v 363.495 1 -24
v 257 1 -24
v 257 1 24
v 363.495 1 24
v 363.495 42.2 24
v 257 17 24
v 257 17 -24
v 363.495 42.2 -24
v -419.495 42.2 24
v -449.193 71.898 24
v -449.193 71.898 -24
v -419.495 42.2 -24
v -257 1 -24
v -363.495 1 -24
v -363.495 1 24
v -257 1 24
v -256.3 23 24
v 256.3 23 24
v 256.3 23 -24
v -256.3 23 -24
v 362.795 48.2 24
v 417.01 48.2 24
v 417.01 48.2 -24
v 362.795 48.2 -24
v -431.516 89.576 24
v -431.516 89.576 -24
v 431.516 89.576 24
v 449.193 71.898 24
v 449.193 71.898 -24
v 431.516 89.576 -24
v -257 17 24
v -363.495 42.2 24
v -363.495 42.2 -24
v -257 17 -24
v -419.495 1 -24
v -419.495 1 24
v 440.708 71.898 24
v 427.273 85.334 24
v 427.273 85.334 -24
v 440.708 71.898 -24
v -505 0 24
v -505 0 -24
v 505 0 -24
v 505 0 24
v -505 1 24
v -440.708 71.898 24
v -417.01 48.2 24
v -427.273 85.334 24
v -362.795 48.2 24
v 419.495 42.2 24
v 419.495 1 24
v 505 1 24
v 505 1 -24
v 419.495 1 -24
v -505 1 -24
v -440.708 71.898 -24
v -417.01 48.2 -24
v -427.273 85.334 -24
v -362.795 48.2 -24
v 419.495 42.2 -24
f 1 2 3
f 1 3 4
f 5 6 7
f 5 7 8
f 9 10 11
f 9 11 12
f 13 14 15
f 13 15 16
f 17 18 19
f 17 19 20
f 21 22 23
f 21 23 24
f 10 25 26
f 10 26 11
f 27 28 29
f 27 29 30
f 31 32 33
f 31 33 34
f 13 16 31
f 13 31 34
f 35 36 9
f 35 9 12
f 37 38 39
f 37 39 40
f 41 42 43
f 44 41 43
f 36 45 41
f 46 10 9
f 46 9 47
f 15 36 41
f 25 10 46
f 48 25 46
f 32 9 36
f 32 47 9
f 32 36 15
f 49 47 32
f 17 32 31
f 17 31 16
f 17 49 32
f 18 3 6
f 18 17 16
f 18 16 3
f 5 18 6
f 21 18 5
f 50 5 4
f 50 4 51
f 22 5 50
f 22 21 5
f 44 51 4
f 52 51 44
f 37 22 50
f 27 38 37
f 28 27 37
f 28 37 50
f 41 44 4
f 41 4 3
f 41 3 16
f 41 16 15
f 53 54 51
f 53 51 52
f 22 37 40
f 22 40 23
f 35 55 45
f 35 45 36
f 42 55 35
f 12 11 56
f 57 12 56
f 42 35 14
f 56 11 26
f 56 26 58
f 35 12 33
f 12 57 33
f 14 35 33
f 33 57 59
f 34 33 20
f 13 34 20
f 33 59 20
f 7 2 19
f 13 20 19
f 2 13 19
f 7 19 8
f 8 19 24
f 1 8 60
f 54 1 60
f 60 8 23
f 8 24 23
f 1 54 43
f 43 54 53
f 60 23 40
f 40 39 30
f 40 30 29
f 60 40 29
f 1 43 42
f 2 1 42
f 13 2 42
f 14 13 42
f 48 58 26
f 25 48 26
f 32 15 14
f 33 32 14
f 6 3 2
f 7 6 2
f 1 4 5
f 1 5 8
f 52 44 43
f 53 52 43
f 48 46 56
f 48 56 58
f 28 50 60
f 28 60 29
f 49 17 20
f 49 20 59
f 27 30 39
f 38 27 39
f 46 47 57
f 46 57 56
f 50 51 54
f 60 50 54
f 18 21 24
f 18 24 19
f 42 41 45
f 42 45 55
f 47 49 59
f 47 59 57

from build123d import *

# Parameters (mm, degrees)
SKETCH2_W           = 1010
SKETCH2_H           = 48
BOSS_EXTRUDE1_DEPTH = 1
SKETCH3_W           = 514
SKETCH3_H           = 48
BOSS_EXTRUDE2_DEPTH = 16
SKETCH4_W           = 56
SKETCH4_H           = 48
BOSS_EXTRUDE3_DEPTH = 41.2
EXTRUDE_THIN1_DEPTH = 48


with BuildPart() as part:
    # Sketch2 → Boss-Extrude1 (new body)
    with BuildSketch(Plane(origin=(0, 0, 0), x_dir=(1, 0, 0), z_dir=(0, 1, 0))):
        Rectangle(SKETCH2_W, SKETCH2_H)
    extrude(amount=BOSS_EXTRUDE1_DEPTH)

    # Sketch3 → Boss-Extrude2 (add)
    with BuildSketch(Plane(origin=(0, 1, 0), x_dir=(1, 0, 0), z_dir=(0, 1, 0))):
        Rectangle(SKETCH3_W, SKETCH3_H)
    extrude(amount=BOSS_EXTRUDE2_DEPTH)

    # Sketch4 → Boss-Extrude3 (add)
    with BuildSketch(Plane(origin=(0, 1, 0), x_dir=(1, 0, 0), z_dir=(0, 1, 0))):
        with Locations((-391.494906848, 0)):
            Rectangle(SKETCH4_W, SKETCH4_H)
    boss_extrude3 = extrude(amount=BOSS_EXTRUDE3_DEPTH)

    # Mirror1: Boss-Extrude3 across plane
    add(boss_extrude3.mirror(Plane(origin=(0, 0, 0), x_dir=(0, 0, 1), z_dir=(1, 0, 0))))

    # Sketch7 → Extrude-Thin1 (add)
    with BuildSketch(Plane.XY.offset(24)):
        Polygon((-431.515722128, 89.576154339), (-449.193391658, 71.89848481), (-419.494906848, 42.2), (-363.494906848, 42.2), (-257, 17), (257, 17), (363.494906848, 42.2), (419.494906848, 42.2), (449.193391658, 71.89848481), (431.515722128, 89.576154339), (427.273081441, 85.333513652), (440.708110284, 71.89848481), (417.009625474, 48.2), (362.794682376, 48.2), (256.299775528, 23), (-256.299775528, 23), (-362.794682376, 48.2), (-417.009625474, 48.2), (-440.708110284, 71.89848481), (-427.273081441, 85.333513652), align=None)
    extrude(amount=-EXTRUDE_THIN1_DEPTH)


solid = part.part
